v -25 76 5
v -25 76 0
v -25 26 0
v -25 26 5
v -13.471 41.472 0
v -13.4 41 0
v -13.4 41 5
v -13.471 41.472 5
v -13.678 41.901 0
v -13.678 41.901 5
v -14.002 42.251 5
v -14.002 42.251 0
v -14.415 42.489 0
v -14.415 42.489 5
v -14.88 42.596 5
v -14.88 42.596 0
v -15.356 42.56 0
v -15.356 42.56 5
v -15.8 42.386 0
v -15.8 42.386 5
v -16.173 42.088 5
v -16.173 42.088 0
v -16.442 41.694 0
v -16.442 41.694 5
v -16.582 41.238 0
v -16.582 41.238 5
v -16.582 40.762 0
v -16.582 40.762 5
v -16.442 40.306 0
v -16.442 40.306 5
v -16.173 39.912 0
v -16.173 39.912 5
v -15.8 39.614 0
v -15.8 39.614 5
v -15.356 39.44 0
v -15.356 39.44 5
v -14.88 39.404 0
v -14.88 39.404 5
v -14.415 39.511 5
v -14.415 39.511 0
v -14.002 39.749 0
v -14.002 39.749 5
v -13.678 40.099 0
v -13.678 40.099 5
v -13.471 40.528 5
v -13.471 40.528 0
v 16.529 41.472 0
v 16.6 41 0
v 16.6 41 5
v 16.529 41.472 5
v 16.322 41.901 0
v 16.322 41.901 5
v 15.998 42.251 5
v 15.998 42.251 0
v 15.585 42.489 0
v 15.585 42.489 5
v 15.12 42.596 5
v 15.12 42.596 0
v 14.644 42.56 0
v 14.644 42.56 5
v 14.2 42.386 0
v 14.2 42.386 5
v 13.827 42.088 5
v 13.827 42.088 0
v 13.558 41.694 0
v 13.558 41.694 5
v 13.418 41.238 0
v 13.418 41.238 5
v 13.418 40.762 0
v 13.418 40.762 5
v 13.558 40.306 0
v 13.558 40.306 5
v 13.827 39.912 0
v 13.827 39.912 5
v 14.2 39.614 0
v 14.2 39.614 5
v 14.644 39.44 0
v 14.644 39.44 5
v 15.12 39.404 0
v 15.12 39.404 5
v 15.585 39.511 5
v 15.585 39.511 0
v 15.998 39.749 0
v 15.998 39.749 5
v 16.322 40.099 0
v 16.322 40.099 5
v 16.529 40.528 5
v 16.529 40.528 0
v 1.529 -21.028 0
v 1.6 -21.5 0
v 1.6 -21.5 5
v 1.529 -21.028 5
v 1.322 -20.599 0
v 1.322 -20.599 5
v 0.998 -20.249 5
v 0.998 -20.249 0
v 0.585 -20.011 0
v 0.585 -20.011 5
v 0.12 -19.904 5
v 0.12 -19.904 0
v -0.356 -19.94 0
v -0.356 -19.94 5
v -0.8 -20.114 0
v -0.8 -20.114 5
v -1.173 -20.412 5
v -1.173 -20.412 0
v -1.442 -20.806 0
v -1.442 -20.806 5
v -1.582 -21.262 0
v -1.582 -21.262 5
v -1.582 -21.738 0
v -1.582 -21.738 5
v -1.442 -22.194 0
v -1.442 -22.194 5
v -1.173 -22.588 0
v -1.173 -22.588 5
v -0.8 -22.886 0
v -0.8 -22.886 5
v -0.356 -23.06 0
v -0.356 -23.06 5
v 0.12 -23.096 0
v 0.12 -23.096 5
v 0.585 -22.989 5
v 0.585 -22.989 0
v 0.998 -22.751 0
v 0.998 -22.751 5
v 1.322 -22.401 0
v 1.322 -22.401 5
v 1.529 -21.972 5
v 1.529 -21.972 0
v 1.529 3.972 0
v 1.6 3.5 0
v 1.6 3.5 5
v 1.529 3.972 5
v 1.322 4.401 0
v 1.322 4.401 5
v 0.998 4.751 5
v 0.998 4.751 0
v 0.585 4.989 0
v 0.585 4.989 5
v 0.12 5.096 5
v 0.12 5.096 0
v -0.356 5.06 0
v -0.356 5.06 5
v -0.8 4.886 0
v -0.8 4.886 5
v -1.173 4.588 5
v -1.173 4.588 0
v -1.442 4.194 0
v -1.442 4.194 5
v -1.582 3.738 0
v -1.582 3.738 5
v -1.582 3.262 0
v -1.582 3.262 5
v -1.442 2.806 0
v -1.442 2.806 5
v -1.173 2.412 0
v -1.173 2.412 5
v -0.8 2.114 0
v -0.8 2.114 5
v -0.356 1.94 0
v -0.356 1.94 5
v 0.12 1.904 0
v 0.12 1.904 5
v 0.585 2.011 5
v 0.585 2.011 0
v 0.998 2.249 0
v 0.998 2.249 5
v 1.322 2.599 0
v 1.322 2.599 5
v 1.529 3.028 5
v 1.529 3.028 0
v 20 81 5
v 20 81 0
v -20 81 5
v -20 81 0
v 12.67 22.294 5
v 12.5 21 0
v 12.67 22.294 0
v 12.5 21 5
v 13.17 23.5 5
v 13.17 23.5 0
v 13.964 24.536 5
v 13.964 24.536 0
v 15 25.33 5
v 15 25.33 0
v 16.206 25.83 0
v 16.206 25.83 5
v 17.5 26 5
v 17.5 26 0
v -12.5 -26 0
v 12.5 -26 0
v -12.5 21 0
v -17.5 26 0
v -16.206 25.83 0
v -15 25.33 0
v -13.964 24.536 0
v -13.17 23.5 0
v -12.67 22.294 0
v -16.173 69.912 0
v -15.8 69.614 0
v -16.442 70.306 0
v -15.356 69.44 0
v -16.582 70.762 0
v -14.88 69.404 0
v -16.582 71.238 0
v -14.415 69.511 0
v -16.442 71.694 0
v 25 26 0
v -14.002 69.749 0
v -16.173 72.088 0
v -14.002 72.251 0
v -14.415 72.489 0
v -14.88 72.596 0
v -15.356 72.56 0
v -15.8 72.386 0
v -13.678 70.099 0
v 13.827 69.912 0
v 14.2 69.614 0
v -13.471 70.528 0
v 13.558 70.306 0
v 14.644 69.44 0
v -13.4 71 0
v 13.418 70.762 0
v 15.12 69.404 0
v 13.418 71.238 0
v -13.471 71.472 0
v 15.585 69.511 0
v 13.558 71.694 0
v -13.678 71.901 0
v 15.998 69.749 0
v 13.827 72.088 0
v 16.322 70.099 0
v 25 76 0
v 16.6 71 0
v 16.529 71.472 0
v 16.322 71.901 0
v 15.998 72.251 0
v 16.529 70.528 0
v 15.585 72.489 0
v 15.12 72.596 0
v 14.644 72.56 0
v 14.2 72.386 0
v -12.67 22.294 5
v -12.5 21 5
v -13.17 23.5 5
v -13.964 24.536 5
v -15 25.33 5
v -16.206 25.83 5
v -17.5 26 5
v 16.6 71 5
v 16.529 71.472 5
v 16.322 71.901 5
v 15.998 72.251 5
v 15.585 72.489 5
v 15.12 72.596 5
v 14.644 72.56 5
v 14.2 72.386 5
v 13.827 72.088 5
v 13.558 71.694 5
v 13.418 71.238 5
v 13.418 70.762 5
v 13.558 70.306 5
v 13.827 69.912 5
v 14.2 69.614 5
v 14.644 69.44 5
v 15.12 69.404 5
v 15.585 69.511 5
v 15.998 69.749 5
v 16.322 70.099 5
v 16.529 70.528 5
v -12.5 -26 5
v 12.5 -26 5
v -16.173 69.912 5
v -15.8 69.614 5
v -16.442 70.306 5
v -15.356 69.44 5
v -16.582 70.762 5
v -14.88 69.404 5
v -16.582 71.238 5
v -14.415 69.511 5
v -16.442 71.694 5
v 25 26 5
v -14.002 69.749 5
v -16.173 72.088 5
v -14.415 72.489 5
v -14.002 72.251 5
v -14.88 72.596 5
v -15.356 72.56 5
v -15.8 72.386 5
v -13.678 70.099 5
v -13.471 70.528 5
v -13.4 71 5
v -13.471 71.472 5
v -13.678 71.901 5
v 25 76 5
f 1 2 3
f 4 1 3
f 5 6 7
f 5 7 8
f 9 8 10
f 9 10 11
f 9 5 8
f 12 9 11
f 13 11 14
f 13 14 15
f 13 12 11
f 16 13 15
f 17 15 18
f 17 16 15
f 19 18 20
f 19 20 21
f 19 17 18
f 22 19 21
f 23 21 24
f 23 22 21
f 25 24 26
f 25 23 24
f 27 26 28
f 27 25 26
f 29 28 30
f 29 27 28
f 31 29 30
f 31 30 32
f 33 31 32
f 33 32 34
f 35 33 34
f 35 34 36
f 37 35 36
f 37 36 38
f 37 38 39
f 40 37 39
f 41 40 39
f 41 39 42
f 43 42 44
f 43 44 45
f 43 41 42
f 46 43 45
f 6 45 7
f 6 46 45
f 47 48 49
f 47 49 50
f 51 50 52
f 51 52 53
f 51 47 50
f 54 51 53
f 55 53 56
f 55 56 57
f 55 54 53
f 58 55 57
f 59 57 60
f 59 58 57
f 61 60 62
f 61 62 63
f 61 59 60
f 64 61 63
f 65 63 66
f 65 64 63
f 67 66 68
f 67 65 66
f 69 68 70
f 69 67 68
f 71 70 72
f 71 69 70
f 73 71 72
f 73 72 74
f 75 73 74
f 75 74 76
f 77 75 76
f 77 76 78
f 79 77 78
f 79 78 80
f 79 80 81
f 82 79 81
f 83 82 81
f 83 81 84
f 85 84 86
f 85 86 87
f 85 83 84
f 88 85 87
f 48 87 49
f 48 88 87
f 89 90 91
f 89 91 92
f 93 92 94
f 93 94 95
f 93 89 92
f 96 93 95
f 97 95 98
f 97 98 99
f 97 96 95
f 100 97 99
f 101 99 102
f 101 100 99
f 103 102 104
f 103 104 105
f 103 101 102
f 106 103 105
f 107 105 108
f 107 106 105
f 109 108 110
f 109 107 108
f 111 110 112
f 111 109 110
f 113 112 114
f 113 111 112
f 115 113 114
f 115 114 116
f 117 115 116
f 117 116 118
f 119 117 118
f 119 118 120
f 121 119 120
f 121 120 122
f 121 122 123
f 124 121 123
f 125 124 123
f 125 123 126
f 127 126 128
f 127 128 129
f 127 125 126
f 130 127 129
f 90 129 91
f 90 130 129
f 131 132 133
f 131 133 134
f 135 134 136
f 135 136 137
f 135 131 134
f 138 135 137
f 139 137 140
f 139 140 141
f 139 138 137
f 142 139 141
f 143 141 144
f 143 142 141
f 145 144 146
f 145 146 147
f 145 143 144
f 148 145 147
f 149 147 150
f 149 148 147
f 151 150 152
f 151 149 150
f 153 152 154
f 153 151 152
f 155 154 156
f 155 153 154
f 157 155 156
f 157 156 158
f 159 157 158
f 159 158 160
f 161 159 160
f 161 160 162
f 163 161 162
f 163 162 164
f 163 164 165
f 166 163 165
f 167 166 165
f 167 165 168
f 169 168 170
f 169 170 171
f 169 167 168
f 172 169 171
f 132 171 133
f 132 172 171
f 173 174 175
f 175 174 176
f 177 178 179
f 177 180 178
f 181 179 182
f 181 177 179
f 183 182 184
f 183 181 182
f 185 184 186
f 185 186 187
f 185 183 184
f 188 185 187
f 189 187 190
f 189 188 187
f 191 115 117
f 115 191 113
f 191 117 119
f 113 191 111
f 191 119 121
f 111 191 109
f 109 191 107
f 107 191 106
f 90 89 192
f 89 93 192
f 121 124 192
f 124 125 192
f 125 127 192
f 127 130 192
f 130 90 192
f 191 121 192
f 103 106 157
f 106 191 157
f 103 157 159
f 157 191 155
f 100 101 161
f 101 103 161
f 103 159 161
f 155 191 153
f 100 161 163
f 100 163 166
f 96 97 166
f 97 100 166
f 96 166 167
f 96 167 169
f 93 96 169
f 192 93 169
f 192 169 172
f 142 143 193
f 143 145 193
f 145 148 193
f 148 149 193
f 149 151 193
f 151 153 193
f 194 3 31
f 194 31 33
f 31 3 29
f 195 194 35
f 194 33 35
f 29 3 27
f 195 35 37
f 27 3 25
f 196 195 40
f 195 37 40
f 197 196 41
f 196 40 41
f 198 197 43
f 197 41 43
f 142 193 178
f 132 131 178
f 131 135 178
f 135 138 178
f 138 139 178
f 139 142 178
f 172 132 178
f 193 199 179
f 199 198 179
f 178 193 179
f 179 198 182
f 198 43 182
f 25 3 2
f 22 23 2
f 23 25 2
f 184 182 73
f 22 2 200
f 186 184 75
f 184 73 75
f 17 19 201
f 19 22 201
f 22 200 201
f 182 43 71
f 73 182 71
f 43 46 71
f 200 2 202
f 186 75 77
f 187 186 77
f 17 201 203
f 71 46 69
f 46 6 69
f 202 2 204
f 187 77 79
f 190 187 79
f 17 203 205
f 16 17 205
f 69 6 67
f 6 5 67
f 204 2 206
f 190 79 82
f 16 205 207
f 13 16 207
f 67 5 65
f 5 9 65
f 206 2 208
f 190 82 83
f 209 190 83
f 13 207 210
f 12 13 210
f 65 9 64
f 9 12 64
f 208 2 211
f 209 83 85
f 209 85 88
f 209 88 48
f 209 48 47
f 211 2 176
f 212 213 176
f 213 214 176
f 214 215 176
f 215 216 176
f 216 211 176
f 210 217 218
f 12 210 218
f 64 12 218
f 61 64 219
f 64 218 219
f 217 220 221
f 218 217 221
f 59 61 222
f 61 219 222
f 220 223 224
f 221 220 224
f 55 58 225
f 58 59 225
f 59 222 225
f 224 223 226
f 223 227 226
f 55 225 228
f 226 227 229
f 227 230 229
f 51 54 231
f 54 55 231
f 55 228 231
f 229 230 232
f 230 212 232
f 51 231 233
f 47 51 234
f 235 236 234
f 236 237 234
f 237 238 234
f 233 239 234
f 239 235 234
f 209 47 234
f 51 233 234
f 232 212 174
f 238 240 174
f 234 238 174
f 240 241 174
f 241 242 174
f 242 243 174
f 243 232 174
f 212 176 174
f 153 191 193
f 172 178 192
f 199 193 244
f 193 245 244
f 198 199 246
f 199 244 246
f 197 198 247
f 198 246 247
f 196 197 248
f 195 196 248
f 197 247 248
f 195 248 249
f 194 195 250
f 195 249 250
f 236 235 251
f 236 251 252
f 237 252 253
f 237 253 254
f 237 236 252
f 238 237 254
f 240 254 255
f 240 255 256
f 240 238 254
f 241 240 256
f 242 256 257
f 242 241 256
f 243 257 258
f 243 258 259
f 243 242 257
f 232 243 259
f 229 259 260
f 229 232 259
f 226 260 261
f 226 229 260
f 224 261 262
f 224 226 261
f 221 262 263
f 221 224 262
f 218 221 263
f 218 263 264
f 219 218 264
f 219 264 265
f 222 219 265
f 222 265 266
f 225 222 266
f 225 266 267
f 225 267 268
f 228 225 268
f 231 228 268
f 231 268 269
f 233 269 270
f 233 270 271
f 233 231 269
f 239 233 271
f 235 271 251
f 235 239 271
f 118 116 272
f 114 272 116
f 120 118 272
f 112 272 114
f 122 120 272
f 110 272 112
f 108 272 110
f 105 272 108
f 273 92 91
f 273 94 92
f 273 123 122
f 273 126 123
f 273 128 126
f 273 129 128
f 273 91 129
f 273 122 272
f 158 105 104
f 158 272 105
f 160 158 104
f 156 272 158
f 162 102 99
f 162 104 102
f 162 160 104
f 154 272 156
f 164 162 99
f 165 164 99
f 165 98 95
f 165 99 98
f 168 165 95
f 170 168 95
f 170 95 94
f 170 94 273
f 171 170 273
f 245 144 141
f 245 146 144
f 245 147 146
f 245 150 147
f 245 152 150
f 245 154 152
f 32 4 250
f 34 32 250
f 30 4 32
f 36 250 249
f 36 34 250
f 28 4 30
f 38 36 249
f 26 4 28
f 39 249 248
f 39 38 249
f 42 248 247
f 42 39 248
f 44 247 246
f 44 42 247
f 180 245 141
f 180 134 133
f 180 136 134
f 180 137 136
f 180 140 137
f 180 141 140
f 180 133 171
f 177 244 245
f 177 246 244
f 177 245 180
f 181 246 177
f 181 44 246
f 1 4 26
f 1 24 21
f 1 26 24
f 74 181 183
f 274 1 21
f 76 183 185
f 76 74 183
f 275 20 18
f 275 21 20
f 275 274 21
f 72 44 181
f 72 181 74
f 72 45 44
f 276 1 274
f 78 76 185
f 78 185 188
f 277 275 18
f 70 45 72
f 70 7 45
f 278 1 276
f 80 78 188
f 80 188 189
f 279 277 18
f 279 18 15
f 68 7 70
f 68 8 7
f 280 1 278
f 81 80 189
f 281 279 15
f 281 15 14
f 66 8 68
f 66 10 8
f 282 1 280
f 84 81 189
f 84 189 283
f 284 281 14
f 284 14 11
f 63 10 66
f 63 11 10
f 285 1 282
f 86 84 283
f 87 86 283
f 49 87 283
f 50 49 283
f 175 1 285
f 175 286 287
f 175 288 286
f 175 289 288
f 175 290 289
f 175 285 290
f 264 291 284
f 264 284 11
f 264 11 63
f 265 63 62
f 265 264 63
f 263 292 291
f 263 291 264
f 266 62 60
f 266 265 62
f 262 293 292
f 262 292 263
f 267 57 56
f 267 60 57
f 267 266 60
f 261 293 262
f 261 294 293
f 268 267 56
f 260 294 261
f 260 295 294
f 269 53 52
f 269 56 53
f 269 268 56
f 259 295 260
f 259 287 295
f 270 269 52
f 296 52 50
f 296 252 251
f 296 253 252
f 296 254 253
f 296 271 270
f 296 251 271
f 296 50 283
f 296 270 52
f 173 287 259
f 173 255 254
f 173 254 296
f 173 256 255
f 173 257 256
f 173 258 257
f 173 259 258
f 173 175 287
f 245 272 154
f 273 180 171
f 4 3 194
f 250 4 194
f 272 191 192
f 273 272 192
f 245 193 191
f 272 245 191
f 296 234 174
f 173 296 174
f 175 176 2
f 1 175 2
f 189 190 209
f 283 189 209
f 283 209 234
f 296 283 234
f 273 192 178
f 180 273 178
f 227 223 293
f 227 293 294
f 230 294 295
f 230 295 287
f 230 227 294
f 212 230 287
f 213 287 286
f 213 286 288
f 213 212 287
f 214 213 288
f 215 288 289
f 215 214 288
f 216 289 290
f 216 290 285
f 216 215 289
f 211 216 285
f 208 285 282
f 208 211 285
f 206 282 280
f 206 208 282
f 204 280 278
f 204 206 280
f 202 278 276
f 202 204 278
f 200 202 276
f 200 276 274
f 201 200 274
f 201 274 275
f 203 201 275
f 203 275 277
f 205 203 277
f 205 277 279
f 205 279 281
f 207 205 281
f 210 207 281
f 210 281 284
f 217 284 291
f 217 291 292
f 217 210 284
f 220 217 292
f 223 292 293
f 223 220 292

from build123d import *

# Parameters (mm, degrees)
SKETCH1_R           = 1.6
BOSS_EXTRUDE1_DEPTH = 5
FILLET1_R           = 5


with BuildPart() as part:
    # Sketch1 → Boss-Extrude1 (new body)
    with BuildSketch(Plane.XY):
        Polygon((-12.5, 26), (-12.5, -26), (12.5, -26), (12.5, 26), (25, 26), (25, 76), (20, 81), (-20, 81), (-25, 76), (-25, 26), align=None)
        with Locations((0, -21.5)):
            Circle(SKETCH1_R, mode=Mode.SUBTRACT)
        with Locations((0, 3.5)):
            Circle(SKETCH1_R, mode=Mode.SUBTRACT)
        with Locations((-15, 71)):
            Circle(SKETCH1_R, mode=Mode.SUBTRACT)
        with Locations((15, 71)):
            Circle(SKETCH1_R, mode=Mode.SUBTRACT)
        with Locations((-15, 41)):
            Circle(SKETCH1_R, mode=Mode.SUBTRACT)
        with Locations((15, 41)):
            Circle(SKETCH1_R, mode=Mode.SUBTRACT)
    extrude(amount=BOSS_EXTRUDE1_DEPTH)

    # Fillet1
    fillet1_edges = [part.edges().sort_by_distance(p)[0] for p in [
        (-12.5, 26, 2.5),
        (12.5, 26, 2.5),
    ]]
    fillet(fillet1_edges, radius=FILLET1_R)


solid = part.part
